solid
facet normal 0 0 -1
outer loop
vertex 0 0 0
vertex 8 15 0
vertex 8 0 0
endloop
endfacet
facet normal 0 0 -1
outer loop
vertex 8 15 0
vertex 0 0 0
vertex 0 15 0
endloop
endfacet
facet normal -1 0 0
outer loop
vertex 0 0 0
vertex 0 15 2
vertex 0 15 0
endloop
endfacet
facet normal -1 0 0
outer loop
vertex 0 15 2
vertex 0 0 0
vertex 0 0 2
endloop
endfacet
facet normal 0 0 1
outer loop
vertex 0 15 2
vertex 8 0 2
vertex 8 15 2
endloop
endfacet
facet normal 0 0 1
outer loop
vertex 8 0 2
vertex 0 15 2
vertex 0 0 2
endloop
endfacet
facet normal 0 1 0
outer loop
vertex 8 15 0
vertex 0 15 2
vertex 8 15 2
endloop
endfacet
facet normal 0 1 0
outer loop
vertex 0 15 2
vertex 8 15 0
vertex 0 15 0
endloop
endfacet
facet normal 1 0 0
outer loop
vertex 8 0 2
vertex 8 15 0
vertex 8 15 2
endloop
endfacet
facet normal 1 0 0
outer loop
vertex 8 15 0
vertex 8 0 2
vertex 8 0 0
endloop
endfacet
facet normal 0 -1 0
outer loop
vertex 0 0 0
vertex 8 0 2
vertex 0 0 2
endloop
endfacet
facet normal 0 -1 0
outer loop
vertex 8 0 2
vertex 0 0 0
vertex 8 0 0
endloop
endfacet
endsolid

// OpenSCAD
difference(){
color("darkorange")
linear_extrude(height = 2)
square([8,15]);

color("coral")
translate([1, 1, 1.5])
square([6,12]);
}

color("coral")
translate([4,14,1.7])
circle(.7);
